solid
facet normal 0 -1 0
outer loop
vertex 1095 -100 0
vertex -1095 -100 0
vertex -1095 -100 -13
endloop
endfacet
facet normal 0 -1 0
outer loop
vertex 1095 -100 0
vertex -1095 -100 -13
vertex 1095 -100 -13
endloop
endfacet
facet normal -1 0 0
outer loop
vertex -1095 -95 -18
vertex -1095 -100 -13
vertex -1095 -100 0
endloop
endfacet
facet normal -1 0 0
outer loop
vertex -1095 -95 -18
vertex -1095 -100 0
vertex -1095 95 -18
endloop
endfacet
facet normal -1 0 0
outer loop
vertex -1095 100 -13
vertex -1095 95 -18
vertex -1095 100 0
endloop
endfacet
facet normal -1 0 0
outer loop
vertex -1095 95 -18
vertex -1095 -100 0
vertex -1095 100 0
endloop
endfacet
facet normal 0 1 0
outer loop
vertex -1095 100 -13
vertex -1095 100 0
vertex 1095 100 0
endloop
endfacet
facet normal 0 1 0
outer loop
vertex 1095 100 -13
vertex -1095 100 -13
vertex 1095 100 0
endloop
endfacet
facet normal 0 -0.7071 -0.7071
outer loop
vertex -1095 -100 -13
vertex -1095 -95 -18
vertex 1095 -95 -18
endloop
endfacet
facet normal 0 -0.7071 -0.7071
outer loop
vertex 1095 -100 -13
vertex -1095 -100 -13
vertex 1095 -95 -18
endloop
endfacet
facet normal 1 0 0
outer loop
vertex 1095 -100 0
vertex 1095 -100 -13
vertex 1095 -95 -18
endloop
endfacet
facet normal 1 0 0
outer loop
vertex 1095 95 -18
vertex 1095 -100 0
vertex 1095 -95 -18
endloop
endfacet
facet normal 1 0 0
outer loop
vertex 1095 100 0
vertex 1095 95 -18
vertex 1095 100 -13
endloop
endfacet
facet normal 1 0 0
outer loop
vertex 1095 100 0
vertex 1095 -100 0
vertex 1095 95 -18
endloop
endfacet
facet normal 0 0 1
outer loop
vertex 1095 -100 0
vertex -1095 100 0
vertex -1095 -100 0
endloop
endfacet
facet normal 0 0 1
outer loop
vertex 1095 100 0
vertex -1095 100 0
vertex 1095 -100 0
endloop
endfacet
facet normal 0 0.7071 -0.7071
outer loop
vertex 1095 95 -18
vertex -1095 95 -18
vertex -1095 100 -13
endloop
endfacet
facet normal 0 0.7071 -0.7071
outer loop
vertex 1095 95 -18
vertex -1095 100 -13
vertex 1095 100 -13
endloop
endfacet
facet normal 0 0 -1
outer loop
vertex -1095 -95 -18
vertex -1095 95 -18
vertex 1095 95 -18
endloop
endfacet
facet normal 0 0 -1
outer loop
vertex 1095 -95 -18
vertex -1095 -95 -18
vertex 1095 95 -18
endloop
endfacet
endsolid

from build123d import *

# Parameters (mm, degrees)
SKETCH_1_W             = 2190
SKETCH_1_H             = 200
SM_BASE_FLANGE_1_DEPTH = 18
CHAMFER_1_SIZE         = 5


# Sheet-metal steps are written as plain solids
with BuildPart() as part:
    # Sketch 1 → 基体-法兰1 (new body)
    with BuildSketch(Plane.XY):
        Rectangle(SKETCH_1_W, SKETCH_1_H)
    extrude(amount=-SM_BASE_FLANGE_1_DEPTH)

    # 倒角1
    chamfer_1_edges = [part.edges().sort_by_distance(p)[0] for p in [
        (0, -100, -18),
        (0, 100, -18),
    ]]
    chamfer(chamfer_1_edges, length=CHAMFER_1_SIZE)


solid = part.part
